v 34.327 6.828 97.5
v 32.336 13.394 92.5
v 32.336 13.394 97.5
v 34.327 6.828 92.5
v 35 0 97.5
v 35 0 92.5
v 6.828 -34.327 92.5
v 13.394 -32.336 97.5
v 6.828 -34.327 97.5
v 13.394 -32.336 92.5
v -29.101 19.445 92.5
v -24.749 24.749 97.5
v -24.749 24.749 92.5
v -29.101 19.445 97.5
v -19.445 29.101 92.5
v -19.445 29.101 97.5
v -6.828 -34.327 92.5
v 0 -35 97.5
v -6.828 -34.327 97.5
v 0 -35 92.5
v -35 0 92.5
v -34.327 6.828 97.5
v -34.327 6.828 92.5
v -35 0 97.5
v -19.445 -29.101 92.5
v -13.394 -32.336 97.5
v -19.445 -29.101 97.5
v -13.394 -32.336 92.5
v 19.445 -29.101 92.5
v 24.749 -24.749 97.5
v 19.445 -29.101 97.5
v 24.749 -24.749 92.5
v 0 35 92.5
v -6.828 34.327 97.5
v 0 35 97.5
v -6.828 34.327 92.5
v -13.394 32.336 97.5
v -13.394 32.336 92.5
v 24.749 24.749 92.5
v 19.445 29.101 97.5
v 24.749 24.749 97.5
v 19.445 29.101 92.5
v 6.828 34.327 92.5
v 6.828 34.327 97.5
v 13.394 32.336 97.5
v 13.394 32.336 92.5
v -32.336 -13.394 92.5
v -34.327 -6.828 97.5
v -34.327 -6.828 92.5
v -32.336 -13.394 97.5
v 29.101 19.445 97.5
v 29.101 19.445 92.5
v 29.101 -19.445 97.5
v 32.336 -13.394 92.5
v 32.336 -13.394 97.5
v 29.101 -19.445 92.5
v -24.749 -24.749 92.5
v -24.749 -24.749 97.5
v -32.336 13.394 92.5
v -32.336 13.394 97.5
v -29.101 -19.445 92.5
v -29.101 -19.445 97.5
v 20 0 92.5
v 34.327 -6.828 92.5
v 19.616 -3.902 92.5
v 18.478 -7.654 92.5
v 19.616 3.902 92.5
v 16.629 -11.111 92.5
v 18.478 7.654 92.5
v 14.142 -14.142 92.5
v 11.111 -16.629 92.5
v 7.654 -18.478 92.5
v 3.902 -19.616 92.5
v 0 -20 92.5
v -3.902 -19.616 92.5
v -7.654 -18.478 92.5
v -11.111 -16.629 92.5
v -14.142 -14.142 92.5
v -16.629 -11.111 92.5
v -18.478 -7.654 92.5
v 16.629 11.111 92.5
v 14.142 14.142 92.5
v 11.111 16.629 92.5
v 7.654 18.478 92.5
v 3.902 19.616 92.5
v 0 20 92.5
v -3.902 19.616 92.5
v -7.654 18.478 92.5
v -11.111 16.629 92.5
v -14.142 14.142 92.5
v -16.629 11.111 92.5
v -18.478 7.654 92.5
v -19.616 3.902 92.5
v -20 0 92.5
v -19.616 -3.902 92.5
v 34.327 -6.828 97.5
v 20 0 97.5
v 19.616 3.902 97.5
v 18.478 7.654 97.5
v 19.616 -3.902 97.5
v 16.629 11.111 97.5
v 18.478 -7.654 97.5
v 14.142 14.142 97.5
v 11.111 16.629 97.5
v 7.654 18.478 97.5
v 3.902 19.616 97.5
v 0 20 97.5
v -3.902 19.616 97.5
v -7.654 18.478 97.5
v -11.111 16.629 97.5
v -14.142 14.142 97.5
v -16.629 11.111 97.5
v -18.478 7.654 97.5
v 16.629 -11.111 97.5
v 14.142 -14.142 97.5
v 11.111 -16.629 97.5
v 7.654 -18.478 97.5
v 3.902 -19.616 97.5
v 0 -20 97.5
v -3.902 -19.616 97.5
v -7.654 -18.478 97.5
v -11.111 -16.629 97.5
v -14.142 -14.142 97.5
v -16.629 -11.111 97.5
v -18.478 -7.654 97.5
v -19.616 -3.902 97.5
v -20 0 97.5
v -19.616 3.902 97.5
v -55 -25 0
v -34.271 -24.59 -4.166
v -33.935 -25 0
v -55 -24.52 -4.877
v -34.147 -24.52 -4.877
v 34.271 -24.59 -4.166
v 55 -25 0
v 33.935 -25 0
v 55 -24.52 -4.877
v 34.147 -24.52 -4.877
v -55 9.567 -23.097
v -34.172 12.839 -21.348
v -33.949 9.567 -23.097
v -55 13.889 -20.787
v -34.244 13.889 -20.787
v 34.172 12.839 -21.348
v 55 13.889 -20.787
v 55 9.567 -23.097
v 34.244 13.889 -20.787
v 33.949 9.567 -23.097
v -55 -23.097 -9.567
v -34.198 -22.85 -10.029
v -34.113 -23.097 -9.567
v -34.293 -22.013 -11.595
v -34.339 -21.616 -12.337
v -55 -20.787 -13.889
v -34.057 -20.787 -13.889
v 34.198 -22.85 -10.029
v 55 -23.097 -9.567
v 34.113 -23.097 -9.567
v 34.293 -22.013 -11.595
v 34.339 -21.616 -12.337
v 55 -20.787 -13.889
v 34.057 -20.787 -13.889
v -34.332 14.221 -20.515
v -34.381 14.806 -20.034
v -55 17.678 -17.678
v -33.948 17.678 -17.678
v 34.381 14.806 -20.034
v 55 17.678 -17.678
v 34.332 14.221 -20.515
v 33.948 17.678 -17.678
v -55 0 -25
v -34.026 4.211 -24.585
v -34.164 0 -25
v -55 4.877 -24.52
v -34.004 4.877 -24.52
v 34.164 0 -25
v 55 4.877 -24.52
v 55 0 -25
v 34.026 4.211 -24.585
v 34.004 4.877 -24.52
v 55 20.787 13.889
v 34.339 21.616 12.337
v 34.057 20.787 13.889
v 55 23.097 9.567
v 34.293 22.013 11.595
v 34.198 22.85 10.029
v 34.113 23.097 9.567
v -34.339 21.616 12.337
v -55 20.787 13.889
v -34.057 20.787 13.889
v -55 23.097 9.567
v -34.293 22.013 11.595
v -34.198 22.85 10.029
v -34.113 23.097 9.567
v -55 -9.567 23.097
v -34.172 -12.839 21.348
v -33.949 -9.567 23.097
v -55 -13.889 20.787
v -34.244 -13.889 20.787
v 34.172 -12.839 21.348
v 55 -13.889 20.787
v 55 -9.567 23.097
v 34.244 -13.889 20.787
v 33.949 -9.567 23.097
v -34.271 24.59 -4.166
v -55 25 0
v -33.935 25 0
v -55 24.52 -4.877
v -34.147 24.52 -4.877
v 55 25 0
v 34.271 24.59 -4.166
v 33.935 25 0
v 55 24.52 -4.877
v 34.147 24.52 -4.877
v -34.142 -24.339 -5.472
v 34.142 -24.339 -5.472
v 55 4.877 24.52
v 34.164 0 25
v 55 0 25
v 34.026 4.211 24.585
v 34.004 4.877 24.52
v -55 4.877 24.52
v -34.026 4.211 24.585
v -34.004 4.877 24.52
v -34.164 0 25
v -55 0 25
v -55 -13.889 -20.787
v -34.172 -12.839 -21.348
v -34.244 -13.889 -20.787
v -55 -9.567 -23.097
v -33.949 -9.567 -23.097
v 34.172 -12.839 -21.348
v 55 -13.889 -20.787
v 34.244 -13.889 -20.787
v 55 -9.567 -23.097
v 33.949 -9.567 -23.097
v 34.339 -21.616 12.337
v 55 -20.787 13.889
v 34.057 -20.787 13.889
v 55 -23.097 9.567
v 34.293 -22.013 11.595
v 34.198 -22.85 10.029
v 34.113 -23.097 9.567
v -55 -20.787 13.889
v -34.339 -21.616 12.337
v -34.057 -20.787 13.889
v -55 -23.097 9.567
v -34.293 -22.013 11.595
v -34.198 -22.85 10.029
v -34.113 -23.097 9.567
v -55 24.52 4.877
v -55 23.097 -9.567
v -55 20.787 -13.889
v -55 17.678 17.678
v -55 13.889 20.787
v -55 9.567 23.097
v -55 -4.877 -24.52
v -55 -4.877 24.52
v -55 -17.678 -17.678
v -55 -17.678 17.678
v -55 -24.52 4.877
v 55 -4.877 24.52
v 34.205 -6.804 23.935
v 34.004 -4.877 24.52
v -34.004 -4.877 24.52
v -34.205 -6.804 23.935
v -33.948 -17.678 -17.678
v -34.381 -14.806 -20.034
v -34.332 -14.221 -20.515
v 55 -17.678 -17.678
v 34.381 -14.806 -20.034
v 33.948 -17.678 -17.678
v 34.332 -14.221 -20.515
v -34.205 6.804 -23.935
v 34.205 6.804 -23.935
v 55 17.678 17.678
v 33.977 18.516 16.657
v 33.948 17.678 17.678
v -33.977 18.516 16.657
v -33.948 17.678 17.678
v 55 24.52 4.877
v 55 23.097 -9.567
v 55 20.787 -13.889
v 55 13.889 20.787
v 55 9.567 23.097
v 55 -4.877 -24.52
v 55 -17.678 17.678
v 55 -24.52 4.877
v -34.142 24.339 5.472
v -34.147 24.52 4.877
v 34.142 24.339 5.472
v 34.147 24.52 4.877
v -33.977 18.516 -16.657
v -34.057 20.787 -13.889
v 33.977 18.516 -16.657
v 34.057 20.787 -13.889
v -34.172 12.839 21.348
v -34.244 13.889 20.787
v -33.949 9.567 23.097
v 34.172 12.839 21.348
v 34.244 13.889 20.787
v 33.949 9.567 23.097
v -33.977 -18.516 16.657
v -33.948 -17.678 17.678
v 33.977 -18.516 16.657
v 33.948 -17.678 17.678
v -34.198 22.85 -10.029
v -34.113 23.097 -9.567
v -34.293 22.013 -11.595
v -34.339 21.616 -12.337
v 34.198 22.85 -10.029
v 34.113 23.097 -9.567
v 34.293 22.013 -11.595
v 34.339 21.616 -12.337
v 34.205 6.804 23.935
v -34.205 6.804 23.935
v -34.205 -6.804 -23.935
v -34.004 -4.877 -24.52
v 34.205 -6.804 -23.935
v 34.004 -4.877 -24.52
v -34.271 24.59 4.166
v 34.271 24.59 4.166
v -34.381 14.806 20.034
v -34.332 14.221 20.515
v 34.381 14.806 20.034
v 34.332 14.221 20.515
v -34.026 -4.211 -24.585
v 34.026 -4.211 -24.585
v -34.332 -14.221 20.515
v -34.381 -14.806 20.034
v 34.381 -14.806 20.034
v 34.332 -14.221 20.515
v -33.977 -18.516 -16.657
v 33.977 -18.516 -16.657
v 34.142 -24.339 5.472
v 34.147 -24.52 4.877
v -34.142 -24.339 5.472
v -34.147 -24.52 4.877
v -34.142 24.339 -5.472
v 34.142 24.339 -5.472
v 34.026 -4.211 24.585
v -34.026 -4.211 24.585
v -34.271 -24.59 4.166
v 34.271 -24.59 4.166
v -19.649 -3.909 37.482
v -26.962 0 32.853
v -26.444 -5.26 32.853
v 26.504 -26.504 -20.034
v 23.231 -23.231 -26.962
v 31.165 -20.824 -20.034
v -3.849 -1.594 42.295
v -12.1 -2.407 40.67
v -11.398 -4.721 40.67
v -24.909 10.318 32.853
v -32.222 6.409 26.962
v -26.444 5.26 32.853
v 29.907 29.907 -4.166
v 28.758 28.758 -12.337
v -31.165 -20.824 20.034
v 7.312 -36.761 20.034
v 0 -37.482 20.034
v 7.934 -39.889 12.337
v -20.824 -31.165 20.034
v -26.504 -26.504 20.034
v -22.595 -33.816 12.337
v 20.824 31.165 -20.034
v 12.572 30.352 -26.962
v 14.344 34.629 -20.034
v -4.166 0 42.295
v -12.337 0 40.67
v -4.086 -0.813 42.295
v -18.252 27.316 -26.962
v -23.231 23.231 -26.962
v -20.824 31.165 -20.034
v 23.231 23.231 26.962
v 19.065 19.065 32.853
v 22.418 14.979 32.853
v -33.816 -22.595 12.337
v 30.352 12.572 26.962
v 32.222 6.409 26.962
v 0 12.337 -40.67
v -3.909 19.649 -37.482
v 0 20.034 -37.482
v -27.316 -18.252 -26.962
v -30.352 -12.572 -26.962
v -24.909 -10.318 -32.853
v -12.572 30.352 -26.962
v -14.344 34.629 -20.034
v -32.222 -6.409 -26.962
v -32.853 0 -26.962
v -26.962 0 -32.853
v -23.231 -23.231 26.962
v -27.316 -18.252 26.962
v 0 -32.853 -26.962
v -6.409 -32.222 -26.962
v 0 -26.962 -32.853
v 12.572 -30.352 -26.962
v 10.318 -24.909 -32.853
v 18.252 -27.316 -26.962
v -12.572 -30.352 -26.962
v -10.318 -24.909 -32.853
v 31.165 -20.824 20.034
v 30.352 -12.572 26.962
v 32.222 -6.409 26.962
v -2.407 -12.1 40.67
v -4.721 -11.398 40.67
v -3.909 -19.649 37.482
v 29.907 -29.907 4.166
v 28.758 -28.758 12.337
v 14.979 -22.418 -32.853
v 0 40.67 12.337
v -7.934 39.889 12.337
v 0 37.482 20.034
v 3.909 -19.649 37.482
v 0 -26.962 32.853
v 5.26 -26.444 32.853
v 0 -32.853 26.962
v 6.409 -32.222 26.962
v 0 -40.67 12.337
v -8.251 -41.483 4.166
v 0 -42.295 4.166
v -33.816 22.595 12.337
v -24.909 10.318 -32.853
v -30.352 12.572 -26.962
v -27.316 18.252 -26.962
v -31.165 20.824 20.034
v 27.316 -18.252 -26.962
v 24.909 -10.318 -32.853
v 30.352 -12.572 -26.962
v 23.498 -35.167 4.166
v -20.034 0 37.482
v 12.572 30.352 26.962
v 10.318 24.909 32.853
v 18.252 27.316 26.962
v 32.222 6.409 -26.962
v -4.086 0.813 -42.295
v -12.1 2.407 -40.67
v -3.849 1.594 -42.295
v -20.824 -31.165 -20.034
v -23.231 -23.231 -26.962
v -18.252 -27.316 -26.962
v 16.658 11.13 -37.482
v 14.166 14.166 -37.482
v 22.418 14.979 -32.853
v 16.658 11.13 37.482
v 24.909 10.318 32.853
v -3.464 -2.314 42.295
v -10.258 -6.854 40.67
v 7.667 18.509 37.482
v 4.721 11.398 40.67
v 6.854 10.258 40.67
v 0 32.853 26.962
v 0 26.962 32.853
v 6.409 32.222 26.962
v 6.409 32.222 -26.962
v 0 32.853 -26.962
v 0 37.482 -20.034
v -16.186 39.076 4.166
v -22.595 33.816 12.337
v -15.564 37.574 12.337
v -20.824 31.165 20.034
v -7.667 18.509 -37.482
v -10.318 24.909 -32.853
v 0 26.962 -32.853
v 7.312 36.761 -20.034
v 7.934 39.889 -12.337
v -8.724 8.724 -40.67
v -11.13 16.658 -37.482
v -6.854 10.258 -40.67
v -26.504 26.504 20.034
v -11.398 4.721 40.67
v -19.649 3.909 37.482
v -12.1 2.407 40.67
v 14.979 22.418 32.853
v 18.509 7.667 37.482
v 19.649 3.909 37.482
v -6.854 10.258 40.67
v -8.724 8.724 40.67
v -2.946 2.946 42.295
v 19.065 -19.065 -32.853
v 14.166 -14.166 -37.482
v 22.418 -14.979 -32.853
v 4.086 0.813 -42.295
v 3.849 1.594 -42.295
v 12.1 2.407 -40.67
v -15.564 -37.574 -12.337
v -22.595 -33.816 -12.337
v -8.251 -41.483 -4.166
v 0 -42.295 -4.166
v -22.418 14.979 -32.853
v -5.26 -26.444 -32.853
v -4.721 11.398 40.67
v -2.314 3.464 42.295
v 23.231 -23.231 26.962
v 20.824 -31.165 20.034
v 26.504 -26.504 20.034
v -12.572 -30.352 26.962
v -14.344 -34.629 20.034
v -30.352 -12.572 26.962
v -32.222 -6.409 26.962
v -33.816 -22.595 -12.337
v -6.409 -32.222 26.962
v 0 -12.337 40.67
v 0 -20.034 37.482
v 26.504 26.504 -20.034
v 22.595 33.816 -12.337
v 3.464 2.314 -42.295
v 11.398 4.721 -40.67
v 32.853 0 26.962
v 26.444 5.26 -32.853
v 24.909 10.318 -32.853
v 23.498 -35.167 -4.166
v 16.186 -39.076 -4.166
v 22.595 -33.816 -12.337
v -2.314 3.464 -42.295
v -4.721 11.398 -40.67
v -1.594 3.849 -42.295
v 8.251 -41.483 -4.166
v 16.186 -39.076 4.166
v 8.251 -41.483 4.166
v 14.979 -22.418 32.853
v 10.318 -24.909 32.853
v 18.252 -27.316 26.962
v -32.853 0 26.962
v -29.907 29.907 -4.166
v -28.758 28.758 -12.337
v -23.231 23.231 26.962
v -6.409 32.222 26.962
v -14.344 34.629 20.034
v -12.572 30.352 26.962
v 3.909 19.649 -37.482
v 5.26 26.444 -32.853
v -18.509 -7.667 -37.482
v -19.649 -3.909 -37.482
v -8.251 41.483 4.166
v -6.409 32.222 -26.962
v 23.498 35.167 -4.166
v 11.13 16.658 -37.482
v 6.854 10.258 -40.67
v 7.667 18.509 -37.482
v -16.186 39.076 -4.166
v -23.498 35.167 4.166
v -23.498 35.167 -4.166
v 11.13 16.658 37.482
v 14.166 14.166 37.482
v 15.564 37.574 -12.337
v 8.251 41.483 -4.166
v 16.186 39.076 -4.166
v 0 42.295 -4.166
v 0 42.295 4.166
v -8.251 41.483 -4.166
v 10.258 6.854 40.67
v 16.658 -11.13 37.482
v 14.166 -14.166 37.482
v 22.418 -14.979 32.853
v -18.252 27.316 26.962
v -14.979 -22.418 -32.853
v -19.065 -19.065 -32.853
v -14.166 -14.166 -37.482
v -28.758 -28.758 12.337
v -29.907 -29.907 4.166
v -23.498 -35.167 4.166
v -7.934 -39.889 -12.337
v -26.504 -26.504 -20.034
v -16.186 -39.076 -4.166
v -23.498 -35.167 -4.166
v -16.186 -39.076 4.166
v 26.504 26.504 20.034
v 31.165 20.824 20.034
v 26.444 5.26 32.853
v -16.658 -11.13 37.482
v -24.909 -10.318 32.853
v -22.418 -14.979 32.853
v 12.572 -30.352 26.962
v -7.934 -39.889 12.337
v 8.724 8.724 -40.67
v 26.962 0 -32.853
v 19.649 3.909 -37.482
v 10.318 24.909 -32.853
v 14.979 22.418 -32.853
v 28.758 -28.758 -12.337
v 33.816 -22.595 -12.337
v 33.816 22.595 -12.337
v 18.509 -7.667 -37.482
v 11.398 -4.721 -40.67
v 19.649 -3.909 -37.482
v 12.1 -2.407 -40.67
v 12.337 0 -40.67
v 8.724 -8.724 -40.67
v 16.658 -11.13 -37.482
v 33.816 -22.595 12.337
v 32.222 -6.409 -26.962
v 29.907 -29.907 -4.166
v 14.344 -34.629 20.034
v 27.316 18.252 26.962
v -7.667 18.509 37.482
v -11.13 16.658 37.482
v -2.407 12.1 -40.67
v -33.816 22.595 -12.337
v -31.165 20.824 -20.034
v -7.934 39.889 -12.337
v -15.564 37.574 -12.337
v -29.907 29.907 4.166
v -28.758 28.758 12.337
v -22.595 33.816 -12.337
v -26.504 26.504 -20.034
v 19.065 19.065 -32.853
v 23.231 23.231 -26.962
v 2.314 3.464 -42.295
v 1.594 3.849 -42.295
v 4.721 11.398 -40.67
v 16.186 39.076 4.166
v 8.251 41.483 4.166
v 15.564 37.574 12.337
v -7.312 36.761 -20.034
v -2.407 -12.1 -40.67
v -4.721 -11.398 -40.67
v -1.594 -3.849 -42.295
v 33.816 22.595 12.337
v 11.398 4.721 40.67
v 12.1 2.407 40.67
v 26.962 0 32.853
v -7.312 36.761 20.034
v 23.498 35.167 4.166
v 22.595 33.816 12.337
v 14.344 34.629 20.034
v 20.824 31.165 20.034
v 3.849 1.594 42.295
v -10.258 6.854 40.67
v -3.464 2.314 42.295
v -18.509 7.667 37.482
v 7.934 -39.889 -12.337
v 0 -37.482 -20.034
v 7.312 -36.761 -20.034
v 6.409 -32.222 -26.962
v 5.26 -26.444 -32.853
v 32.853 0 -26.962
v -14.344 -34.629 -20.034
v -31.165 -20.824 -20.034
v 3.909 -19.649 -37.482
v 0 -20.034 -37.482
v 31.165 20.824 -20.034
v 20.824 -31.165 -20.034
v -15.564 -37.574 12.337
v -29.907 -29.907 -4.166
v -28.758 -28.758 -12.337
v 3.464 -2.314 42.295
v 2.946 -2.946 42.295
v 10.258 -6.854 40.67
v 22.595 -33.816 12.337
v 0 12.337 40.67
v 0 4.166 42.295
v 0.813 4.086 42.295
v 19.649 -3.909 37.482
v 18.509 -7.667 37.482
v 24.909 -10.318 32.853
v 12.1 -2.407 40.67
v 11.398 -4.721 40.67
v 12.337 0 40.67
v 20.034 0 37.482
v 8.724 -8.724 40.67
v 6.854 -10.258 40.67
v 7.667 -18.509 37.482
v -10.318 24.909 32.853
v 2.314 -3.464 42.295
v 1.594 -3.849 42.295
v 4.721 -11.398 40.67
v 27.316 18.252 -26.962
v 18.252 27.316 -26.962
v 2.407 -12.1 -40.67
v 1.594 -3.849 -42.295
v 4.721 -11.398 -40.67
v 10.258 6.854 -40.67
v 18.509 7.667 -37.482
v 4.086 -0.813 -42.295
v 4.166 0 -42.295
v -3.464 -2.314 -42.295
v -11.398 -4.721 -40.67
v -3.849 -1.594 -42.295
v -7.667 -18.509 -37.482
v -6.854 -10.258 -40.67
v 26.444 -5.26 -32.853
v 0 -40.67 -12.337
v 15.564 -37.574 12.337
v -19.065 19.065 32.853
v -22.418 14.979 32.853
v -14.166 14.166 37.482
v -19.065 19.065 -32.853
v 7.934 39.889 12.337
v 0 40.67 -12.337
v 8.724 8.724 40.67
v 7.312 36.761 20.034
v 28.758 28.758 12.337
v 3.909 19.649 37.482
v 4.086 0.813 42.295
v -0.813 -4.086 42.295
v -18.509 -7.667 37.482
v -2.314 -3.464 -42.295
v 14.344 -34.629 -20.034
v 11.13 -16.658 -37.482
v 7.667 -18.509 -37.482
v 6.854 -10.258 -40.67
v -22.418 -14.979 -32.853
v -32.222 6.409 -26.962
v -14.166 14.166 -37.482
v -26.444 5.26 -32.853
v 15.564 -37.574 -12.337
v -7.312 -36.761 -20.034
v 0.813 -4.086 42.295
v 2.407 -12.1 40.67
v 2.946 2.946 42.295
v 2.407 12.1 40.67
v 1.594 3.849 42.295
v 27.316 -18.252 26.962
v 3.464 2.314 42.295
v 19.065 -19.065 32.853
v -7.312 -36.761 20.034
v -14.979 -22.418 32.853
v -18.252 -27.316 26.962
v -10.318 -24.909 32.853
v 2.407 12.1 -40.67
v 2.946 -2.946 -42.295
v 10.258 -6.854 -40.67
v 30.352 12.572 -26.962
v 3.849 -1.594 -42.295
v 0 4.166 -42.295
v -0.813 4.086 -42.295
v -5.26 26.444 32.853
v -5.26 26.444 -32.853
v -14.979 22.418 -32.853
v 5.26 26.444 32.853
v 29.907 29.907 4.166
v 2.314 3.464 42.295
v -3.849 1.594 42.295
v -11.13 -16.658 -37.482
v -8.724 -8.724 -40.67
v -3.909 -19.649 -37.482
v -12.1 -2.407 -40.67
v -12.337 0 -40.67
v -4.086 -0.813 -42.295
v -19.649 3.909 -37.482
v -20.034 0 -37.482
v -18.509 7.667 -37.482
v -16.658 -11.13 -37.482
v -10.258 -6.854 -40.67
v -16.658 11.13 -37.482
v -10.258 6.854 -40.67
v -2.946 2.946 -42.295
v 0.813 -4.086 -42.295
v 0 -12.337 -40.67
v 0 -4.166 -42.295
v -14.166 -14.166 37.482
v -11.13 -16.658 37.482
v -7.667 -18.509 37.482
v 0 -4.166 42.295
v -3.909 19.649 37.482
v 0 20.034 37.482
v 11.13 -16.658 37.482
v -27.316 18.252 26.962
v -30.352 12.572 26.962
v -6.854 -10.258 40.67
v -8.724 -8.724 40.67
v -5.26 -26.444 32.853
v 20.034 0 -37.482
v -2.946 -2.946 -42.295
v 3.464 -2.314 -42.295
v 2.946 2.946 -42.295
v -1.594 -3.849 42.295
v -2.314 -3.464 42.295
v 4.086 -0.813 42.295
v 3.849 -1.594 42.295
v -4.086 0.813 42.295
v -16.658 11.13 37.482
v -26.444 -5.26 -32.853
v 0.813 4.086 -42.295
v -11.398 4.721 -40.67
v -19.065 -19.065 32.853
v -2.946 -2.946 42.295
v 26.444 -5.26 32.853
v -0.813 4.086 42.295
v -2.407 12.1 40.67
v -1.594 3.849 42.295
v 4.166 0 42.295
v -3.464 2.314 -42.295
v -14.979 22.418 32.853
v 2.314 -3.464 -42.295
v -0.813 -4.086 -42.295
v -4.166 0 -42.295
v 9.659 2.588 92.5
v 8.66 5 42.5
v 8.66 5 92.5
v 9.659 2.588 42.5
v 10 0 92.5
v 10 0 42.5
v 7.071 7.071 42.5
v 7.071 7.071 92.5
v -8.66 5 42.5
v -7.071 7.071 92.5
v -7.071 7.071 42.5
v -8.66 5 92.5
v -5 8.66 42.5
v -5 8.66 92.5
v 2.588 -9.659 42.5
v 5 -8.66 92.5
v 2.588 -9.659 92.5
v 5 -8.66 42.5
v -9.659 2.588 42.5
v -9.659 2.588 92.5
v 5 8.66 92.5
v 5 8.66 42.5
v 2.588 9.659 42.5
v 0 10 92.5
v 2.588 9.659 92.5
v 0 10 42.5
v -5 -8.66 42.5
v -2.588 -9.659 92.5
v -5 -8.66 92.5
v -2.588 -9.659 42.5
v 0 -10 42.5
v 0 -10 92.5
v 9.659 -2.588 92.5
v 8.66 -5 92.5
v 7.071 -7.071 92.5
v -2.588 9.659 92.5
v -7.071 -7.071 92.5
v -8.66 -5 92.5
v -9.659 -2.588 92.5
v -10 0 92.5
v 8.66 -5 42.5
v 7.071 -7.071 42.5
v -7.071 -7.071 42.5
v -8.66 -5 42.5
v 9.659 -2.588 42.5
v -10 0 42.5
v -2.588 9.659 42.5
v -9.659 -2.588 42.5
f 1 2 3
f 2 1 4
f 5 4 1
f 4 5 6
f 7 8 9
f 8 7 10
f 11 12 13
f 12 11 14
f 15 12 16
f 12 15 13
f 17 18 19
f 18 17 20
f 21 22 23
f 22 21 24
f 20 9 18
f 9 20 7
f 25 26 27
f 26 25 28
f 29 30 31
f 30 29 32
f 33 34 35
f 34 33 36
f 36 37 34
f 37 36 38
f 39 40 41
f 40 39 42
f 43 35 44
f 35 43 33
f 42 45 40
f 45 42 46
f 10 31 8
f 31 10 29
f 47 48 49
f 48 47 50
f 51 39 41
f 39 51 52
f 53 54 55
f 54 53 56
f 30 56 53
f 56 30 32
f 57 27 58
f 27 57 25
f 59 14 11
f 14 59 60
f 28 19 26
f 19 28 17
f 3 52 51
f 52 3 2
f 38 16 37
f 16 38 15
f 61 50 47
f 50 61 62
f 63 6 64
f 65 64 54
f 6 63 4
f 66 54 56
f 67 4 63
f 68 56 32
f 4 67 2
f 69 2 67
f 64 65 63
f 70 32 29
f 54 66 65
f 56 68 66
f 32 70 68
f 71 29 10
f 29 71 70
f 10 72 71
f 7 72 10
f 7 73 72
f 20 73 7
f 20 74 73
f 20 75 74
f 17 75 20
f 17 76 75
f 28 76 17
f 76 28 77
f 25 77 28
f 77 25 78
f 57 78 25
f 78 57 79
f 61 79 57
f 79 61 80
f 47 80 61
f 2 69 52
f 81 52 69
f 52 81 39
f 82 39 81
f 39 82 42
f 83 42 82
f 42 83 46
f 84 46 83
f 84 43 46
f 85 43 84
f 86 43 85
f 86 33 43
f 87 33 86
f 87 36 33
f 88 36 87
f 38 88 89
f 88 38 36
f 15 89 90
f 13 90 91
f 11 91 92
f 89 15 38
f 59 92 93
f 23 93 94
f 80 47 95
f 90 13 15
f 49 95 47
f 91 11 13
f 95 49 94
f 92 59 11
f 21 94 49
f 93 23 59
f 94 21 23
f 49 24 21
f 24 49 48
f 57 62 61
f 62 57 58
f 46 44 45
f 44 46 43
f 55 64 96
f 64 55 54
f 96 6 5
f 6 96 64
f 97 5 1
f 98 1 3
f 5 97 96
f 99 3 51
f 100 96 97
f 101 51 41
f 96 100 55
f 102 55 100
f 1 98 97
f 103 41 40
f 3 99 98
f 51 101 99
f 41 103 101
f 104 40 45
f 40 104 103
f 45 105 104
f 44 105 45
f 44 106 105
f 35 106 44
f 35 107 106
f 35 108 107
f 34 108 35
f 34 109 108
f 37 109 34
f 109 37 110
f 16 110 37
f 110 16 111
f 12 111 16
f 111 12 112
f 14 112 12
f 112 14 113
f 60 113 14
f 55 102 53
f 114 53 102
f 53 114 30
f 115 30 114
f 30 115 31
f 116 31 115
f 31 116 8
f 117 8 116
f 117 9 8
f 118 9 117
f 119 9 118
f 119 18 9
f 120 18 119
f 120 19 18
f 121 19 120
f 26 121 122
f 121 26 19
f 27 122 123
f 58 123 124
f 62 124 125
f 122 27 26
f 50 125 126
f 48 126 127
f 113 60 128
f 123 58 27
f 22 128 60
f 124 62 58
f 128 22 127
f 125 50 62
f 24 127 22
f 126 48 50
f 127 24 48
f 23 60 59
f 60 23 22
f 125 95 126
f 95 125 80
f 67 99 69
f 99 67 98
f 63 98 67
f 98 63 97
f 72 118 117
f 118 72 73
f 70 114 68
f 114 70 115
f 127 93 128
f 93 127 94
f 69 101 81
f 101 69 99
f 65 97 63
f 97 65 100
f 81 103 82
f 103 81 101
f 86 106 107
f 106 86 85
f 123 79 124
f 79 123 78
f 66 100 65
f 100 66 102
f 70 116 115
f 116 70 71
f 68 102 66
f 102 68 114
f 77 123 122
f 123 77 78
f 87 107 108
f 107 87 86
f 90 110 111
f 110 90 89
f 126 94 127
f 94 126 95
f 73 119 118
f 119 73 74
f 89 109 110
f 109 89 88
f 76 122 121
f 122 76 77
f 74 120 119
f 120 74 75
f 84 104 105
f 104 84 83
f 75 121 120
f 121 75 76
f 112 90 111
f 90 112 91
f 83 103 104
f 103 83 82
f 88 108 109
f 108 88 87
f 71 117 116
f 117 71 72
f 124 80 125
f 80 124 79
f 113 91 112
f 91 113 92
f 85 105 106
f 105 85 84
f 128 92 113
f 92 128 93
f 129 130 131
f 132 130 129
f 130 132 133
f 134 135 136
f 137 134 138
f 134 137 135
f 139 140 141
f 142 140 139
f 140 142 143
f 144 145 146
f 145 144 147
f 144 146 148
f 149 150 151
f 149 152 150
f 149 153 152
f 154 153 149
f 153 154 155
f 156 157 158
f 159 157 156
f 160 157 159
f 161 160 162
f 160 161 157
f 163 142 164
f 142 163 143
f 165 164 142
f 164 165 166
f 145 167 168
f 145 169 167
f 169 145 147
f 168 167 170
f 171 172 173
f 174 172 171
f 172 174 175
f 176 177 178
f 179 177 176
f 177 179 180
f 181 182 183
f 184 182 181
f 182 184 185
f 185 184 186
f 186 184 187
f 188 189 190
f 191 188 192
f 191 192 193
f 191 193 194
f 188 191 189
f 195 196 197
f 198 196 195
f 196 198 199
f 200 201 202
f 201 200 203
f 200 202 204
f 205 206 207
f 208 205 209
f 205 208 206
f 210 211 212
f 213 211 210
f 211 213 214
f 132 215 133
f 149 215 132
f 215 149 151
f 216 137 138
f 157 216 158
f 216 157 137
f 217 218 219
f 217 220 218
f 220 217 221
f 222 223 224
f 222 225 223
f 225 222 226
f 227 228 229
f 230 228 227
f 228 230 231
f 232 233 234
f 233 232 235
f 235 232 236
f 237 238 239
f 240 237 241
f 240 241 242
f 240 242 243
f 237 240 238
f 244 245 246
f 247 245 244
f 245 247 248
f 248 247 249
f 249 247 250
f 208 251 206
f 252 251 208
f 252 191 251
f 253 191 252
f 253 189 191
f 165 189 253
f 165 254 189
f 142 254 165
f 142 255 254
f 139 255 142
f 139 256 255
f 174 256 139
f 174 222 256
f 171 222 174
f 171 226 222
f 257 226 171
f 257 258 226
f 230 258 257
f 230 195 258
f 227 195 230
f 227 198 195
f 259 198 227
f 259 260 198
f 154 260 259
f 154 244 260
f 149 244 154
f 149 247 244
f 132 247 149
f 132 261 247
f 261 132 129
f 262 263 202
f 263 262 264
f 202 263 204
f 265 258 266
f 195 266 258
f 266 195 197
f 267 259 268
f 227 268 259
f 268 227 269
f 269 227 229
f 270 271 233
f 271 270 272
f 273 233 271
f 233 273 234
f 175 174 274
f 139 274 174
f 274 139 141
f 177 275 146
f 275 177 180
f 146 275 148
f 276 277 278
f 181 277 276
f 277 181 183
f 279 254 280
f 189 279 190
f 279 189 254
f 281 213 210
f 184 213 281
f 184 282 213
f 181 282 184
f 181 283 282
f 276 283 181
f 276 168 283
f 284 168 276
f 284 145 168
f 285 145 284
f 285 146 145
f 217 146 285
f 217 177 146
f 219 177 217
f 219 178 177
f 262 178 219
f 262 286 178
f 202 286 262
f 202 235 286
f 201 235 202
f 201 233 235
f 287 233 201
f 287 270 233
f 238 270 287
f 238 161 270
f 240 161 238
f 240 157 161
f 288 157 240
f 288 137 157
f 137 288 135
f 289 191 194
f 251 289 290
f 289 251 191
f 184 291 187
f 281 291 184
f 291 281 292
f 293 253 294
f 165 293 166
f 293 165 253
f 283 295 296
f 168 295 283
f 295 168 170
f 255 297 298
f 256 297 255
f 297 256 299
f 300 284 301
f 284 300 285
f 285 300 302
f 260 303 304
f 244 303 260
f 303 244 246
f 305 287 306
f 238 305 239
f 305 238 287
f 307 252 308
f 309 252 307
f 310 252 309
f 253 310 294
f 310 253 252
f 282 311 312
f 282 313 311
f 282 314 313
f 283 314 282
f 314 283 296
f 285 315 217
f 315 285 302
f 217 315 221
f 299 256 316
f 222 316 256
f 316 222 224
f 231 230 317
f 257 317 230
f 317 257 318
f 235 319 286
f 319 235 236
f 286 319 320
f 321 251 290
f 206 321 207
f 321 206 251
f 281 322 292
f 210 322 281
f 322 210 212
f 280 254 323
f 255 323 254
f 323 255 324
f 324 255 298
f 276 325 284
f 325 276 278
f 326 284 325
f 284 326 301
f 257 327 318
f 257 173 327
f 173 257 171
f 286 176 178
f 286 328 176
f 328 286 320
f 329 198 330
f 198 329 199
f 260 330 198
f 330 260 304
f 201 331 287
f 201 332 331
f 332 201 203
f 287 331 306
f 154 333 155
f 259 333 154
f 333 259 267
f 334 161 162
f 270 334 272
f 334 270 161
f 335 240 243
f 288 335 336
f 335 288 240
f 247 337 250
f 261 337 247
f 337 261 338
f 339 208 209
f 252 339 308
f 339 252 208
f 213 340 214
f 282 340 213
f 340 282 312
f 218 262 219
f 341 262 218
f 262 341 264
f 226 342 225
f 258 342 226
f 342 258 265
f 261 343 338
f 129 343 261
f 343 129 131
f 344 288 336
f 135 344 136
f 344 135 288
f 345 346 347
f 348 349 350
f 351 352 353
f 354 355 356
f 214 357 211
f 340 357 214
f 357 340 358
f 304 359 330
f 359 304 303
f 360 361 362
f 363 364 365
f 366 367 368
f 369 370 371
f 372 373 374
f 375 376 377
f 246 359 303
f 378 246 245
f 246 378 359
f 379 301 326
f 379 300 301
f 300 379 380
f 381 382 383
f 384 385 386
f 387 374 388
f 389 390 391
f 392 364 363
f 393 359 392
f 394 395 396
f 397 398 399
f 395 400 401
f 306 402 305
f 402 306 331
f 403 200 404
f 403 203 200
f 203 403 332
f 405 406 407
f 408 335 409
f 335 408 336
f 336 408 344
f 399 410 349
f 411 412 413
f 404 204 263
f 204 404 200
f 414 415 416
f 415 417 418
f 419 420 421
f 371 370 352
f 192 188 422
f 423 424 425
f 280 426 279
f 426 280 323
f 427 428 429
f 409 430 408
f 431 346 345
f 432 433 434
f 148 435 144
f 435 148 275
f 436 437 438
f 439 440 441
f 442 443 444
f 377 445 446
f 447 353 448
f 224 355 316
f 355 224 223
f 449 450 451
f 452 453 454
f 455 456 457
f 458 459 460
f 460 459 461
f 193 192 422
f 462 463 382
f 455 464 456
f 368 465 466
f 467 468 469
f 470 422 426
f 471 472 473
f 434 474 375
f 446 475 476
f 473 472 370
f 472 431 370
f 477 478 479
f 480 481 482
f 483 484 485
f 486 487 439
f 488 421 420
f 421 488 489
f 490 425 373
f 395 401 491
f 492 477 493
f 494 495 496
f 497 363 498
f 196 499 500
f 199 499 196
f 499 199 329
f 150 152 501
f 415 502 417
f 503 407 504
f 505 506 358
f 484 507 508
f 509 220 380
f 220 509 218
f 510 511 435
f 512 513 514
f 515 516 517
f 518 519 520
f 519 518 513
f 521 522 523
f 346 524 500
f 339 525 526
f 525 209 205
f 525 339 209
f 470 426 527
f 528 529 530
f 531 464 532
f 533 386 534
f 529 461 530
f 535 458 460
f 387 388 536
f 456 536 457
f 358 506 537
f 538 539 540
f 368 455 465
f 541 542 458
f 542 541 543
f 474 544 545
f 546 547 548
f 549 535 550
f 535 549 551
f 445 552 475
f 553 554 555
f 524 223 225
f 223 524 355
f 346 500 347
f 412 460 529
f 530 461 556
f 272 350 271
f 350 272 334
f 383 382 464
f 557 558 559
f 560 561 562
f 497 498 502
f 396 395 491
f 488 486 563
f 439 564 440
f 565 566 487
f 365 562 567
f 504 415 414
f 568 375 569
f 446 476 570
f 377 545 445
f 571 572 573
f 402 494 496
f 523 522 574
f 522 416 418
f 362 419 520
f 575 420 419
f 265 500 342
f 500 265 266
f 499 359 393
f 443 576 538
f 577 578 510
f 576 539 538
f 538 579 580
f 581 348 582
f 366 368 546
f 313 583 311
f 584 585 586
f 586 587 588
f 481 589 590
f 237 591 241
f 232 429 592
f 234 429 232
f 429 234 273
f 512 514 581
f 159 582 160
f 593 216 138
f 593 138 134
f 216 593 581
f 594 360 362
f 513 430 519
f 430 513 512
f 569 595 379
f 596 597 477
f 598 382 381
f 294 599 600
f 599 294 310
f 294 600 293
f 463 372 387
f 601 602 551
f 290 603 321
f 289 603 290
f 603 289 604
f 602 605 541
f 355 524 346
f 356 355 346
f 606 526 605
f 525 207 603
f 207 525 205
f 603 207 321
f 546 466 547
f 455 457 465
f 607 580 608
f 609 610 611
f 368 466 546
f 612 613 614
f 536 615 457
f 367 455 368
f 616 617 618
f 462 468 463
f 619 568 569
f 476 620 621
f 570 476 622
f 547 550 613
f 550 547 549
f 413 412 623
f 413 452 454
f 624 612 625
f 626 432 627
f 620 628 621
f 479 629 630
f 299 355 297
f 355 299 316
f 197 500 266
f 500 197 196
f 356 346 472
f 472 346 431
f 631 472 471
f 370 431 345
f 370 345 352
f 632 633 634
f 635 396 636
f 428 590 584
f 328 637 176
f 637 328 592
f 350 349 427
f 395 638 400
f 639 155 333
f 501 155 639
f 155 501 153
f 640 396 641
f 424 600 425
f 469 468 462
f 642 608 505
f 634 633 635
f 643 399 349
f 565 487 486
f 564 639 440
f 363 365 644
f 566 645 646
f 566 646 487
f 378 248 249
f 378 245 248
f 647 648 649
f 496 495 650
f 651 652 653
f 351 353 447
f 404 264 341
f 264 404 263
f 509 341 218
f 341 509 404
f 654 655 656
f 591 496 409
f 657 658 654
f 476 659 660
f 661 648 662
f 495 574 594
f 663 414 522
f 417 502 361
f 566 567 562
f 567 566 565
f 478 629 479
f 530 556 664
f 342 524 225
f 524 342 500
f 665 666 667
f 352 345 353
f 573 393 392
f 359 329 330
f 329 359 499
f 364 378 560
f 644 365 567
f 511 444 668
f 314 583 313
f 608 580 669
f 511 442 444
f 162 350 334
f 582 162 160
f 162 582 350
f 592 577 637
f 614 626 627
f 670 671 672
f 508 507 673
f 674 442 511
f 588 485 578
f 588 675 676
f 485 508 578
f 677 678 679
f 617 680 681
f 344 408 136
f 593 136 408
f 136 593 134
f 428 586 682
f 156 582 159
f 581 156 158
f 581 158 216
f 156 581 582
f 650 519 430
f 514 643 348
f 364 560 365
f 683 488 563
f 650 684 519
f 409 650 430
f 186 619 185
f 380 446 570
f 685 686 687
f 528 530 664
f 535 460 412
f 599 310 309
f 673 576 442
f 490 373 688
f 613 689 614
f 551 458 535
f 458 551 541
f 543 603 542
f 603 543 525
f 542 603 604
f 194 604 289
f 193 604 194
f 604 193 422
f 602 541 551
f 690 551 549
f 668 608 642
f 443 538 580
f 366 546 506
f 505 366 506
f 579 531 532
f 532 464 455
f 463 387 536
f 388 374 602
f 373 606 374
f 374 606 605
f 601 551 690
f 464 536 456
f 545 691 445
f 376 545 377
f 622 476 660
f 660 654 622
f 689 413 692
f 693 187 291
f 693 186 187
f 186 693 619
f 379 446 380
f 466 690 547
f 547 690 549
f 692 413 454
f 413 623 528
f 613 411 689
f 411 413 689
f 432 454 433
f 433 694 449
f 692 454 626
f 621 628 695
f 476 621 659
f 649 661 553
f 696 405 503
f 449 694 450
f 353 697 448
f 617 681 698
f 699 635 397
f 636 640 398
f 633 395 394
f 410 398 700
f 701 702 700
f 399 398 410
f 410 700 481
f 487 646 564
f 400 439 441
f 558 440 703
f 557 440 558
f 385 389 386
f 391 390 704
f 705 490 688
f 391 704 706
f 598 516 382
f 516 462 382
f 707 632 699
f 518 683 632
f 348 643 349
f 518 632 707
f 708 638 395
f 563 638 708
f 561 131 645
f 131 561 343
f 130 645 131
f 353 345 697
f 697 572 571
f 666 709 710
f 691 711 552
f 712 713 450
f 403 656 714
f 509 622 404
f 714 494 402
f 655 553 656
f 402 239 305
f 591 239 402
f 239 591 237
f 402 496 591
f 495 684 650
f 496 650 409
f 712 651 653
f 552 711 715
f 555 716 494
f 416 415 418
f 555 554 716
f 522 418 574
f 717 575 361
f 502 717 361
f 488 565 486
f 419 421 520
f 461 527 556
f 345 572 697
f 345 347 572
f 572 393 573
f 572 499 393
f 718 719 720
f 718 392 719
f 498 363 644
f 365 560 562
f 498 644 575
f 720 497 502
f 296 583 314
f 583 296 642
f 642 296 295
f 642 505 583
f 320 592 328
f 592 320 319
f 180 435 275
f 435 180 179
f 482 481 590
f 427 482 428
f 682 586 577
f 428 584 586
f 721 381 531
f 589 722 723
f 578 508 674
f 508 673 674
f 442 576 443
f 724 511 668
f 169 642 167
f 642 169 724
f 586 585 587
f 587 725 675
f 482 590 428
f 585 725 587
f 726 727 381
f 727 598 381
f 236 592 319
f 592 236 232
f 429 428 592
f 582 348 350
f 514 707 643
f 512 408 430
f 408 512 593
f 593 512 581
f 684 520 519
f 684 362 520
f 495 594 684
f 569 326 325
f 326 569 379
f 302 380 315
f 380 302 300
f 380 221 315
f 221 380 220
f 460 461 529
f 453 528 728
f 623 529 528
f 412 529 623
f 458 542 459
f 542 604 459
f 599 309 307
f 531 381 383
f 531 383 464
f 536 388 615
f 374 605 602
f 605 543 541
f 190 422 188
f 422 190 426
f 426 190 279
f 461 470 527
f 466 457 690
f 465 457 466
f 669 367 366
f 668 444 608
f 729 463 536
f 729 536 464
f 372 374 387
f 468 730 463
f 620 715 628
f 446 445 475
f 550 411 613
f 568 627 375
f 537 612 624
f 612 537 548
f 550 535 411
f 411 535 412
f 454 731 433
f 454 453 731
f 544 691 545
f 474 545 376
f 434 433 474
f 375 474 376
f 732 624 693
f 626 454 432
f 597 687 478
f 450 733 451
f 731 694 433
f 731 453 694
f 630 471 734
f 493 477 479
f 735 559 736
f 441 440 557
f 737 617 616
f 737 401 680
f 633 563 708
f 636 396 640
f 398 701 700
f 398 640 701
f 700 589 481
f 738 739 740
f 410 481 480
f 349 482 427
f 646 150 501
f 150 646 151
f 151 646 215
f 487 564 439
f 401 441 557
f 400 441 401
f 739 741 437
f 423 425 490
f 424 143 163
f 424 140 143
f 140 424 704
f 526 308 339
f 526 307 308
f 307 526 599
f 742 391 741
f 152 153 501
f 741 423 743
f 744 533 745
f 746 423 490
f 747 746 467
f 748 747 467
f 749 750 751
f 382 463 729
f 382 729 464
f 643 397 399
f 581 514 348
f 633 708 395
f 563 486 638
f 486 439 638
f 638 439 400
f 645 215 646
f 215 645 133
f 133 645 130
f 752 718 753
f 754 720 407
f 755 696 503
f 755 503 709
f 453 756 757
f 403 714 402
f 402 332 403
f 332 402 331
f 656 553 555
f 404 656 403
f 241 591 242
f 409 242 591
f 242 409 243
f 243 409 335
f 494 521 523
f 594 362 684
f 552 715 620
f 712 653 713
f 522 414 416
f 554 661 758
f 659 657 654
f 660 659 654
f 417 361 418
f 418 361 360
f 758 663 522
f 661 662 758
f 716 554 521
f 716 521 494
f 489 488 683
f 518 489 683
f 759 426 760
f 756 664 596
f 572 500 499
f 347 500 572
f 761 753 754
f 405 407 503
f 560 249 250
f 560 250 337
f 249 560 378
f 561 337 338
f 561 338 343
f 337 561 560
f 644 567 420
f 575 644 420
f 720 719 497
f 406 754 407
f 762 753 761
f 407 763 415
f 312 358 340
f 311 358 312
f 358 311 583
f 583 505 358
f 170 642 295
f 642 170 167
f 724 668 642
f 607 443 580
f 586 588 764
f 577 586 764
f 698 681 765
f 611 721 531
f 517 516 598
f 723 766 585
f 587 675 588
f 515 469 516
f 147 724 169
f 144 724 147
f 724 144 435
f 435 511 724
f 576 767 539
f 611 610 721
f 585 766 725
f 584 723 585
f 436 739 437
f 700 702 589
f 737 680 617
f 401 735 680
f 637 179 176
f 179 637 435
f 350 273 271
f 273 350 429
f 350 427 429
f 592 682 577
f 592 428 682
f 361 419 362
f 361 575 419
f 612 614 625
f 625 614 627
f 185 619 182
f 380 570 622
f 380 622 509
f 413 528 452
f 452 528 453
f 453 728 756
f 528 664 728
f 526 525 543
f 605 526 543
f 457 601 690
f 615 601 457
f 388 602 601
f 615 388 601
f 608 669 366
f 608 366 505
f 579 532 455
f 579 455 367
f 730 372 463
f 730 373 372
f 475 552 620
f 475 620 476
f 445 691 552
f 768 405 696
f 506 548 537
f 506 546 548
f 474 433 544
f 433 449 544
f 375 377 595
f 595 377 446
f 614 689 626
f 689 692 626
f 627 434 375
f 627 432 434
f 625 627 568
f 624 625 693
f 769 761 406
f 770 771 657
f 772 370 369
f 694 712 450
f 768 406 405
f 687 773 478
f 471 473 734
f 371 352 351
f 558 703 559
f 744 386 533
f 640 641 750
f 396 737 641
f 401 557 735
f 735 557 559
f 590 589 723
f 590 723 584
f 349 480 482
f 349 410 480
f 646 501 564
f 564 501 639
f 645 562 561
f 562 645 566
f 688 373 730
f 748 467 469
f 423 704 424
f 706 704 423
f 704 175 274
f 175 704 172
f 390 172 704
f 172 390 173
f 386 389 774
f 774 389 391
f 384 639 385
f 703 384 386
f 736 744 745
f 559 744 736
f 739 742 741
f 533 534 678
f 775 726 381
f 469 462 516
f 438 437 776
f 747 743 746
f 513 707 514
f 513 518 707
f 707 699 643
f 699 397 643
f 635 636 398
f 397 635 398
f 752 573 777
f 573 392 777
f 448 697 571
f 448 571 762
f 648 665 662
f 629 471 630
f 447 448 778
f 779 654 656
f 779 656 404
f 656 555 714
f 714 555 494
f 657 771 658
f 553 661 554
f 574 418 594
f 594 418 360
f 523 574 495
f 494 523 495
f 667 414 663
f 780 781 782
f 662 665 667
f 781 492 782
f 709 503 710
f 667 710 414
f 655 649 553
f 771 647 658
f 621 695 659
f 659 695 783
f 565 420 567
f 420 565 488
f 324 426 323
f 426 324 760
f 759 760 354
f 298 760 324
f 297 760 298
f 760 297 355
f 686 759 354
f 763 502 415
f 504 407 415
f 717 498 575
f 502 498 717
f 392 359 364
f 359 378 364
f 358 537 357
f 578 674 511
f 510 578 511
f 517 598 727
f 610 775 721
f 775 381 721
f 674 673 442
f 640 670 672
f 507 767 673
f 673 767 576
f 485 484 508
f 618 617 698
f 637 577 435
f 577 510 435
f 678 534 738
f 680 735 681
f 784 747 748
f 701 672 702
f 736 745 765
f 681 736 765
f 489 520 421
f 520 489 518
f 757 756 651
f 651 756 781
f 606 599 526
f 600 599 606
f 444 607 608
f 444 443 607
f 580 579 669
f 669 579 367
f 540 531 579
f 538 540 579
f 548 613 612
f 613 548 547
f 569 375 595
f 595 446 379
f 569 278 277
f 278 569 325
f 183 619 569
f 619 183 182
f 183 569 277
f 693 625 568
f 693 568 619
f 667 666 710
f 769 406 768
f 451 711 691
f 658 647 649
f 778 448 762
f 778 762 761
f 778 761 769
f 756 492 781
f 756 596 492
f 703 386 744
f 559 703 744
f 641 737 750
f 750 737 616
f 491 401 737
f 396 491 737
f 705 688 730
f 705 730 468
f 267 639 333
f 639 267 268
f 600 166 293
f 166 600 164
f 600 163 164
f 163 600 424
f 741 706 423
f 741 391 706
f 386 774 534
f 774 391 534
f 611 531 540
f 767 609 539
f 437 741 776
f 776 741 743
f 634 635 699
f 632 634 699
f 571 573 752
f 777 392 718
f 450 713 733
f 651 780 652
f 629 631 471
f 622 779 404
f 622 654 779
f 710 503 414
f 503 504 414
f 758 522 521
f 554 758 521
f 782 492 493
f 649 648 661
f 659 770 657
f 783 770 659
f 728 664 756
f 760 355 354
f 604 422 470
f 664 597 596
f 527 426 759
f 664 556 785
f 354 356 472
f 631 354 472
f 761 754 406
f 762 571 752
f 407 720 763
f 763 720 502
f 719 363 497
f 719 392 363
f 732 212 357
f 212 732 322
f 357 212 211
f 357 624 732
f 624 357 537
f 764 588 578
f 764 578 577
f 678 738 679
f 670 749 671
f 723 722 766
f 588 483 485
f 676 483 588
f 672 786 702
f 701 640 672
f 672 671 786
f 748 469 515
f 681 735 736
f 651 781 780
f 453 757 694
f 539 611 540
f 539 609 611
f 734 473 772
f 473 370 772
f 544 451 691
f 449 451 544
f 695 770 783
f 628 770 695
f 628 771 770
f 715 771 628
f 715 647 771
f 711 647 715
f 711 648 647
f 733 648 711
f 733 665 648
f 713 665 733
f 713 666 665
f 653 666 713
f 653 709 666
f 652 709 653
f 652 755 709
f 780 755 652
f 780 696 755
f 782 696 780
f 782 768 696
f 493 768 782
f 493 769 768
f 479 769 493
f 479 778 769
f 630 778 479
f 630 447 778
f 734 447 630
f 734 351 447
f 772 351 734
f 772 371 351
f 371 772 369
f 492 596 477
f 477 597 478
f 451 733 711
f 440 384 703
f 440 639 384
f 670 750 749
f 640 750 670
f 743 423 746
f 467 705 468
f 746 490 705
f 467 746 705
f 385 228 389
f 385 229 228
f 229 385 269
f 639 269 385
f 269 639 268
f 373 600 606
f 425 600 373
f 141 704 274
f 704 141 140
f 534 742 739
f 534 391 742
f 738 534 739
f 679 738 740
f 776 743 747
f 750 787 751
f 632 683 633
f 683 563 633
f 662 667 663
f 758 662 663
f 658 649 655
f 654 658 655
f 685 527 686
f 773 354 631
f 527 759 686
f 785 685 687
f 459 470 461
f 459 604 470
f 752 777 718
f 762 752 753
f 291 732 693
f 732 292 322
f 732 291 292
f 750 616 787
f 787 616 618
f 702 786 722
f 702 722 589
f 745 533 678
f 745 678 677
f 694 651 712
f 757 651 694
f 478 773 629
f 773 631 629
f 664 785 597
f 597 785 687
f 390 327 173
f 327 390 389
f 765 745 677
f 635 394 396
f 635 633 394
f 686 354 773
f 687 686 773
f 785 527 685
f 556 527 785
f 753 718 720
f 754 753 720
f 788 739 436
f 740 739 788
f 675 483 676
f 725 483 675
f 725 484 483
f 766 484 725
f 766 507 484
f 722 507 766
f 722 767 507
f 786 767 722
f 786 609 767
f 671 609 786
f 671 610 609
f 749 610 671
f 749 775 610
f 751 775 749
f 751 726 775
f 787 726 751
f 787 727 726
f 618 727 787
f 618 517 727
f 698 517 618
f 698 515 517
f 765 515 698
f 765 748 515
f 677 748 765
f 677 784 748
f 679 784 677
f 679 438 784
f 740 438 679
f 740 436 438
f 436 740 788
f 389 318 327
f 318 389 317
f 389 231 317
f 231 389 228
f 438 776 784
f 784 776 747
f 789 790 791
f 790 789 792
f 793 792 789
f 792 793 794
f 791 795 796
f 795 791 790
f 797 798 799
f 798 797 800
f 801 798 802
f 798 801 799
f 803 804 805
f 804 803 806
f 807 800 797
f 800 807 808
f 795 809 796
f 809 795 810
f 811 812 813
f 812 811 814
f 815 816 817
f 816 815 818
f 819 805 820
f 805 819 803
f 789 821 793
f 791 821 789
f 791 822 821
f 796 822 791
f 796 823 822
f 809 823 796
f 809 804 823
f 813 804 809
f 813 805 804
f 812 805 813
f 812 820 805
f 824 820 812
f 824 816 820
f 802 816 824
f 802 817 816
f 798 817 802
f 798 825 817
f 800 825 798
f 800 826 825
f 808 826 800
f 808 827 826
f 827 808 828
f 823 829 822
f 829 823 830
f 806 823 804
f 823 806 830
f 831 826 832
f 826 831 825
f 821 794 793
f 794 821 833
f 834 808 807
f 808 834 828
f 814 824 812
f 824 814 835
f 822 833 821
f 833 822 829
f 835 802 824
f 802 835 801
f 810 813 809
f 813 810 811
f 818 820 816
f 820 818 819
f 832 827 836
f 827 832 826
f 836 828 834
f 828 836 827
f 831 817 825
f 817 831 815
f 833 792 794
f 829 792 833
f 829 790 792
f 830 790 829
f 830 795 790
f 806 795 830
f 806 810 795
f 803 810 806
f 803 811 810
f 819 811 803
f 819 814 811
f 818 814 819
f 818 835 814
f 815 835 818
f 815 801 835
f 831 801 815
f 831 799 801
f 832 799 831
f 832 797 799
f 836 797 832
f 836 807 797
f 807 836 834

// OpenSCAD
// Globe valve 2" threaded (used for drains + test valves).
body_d = 85;
body_l = 110;
union() {
    rotate([0, 90, 0])
        cylinder(h = body_l, d = 50, center = true, $fn = 32);
    sphere(d = body_d, $fn = 32);
    // Yoke + handwheel
    translate([0, 0, body_d / 2])
        cylinder(h = 50, d = 20, $fn = 24);
    translate([0, 0, body_d / 2 + 50])
        difference() {
            cylinder(h = 5, d = 70, $fn = 32);
            translate([0, 0, -0.1]) cylinder(h = 5.2, d = 40, $fn = 32);
        }
}
